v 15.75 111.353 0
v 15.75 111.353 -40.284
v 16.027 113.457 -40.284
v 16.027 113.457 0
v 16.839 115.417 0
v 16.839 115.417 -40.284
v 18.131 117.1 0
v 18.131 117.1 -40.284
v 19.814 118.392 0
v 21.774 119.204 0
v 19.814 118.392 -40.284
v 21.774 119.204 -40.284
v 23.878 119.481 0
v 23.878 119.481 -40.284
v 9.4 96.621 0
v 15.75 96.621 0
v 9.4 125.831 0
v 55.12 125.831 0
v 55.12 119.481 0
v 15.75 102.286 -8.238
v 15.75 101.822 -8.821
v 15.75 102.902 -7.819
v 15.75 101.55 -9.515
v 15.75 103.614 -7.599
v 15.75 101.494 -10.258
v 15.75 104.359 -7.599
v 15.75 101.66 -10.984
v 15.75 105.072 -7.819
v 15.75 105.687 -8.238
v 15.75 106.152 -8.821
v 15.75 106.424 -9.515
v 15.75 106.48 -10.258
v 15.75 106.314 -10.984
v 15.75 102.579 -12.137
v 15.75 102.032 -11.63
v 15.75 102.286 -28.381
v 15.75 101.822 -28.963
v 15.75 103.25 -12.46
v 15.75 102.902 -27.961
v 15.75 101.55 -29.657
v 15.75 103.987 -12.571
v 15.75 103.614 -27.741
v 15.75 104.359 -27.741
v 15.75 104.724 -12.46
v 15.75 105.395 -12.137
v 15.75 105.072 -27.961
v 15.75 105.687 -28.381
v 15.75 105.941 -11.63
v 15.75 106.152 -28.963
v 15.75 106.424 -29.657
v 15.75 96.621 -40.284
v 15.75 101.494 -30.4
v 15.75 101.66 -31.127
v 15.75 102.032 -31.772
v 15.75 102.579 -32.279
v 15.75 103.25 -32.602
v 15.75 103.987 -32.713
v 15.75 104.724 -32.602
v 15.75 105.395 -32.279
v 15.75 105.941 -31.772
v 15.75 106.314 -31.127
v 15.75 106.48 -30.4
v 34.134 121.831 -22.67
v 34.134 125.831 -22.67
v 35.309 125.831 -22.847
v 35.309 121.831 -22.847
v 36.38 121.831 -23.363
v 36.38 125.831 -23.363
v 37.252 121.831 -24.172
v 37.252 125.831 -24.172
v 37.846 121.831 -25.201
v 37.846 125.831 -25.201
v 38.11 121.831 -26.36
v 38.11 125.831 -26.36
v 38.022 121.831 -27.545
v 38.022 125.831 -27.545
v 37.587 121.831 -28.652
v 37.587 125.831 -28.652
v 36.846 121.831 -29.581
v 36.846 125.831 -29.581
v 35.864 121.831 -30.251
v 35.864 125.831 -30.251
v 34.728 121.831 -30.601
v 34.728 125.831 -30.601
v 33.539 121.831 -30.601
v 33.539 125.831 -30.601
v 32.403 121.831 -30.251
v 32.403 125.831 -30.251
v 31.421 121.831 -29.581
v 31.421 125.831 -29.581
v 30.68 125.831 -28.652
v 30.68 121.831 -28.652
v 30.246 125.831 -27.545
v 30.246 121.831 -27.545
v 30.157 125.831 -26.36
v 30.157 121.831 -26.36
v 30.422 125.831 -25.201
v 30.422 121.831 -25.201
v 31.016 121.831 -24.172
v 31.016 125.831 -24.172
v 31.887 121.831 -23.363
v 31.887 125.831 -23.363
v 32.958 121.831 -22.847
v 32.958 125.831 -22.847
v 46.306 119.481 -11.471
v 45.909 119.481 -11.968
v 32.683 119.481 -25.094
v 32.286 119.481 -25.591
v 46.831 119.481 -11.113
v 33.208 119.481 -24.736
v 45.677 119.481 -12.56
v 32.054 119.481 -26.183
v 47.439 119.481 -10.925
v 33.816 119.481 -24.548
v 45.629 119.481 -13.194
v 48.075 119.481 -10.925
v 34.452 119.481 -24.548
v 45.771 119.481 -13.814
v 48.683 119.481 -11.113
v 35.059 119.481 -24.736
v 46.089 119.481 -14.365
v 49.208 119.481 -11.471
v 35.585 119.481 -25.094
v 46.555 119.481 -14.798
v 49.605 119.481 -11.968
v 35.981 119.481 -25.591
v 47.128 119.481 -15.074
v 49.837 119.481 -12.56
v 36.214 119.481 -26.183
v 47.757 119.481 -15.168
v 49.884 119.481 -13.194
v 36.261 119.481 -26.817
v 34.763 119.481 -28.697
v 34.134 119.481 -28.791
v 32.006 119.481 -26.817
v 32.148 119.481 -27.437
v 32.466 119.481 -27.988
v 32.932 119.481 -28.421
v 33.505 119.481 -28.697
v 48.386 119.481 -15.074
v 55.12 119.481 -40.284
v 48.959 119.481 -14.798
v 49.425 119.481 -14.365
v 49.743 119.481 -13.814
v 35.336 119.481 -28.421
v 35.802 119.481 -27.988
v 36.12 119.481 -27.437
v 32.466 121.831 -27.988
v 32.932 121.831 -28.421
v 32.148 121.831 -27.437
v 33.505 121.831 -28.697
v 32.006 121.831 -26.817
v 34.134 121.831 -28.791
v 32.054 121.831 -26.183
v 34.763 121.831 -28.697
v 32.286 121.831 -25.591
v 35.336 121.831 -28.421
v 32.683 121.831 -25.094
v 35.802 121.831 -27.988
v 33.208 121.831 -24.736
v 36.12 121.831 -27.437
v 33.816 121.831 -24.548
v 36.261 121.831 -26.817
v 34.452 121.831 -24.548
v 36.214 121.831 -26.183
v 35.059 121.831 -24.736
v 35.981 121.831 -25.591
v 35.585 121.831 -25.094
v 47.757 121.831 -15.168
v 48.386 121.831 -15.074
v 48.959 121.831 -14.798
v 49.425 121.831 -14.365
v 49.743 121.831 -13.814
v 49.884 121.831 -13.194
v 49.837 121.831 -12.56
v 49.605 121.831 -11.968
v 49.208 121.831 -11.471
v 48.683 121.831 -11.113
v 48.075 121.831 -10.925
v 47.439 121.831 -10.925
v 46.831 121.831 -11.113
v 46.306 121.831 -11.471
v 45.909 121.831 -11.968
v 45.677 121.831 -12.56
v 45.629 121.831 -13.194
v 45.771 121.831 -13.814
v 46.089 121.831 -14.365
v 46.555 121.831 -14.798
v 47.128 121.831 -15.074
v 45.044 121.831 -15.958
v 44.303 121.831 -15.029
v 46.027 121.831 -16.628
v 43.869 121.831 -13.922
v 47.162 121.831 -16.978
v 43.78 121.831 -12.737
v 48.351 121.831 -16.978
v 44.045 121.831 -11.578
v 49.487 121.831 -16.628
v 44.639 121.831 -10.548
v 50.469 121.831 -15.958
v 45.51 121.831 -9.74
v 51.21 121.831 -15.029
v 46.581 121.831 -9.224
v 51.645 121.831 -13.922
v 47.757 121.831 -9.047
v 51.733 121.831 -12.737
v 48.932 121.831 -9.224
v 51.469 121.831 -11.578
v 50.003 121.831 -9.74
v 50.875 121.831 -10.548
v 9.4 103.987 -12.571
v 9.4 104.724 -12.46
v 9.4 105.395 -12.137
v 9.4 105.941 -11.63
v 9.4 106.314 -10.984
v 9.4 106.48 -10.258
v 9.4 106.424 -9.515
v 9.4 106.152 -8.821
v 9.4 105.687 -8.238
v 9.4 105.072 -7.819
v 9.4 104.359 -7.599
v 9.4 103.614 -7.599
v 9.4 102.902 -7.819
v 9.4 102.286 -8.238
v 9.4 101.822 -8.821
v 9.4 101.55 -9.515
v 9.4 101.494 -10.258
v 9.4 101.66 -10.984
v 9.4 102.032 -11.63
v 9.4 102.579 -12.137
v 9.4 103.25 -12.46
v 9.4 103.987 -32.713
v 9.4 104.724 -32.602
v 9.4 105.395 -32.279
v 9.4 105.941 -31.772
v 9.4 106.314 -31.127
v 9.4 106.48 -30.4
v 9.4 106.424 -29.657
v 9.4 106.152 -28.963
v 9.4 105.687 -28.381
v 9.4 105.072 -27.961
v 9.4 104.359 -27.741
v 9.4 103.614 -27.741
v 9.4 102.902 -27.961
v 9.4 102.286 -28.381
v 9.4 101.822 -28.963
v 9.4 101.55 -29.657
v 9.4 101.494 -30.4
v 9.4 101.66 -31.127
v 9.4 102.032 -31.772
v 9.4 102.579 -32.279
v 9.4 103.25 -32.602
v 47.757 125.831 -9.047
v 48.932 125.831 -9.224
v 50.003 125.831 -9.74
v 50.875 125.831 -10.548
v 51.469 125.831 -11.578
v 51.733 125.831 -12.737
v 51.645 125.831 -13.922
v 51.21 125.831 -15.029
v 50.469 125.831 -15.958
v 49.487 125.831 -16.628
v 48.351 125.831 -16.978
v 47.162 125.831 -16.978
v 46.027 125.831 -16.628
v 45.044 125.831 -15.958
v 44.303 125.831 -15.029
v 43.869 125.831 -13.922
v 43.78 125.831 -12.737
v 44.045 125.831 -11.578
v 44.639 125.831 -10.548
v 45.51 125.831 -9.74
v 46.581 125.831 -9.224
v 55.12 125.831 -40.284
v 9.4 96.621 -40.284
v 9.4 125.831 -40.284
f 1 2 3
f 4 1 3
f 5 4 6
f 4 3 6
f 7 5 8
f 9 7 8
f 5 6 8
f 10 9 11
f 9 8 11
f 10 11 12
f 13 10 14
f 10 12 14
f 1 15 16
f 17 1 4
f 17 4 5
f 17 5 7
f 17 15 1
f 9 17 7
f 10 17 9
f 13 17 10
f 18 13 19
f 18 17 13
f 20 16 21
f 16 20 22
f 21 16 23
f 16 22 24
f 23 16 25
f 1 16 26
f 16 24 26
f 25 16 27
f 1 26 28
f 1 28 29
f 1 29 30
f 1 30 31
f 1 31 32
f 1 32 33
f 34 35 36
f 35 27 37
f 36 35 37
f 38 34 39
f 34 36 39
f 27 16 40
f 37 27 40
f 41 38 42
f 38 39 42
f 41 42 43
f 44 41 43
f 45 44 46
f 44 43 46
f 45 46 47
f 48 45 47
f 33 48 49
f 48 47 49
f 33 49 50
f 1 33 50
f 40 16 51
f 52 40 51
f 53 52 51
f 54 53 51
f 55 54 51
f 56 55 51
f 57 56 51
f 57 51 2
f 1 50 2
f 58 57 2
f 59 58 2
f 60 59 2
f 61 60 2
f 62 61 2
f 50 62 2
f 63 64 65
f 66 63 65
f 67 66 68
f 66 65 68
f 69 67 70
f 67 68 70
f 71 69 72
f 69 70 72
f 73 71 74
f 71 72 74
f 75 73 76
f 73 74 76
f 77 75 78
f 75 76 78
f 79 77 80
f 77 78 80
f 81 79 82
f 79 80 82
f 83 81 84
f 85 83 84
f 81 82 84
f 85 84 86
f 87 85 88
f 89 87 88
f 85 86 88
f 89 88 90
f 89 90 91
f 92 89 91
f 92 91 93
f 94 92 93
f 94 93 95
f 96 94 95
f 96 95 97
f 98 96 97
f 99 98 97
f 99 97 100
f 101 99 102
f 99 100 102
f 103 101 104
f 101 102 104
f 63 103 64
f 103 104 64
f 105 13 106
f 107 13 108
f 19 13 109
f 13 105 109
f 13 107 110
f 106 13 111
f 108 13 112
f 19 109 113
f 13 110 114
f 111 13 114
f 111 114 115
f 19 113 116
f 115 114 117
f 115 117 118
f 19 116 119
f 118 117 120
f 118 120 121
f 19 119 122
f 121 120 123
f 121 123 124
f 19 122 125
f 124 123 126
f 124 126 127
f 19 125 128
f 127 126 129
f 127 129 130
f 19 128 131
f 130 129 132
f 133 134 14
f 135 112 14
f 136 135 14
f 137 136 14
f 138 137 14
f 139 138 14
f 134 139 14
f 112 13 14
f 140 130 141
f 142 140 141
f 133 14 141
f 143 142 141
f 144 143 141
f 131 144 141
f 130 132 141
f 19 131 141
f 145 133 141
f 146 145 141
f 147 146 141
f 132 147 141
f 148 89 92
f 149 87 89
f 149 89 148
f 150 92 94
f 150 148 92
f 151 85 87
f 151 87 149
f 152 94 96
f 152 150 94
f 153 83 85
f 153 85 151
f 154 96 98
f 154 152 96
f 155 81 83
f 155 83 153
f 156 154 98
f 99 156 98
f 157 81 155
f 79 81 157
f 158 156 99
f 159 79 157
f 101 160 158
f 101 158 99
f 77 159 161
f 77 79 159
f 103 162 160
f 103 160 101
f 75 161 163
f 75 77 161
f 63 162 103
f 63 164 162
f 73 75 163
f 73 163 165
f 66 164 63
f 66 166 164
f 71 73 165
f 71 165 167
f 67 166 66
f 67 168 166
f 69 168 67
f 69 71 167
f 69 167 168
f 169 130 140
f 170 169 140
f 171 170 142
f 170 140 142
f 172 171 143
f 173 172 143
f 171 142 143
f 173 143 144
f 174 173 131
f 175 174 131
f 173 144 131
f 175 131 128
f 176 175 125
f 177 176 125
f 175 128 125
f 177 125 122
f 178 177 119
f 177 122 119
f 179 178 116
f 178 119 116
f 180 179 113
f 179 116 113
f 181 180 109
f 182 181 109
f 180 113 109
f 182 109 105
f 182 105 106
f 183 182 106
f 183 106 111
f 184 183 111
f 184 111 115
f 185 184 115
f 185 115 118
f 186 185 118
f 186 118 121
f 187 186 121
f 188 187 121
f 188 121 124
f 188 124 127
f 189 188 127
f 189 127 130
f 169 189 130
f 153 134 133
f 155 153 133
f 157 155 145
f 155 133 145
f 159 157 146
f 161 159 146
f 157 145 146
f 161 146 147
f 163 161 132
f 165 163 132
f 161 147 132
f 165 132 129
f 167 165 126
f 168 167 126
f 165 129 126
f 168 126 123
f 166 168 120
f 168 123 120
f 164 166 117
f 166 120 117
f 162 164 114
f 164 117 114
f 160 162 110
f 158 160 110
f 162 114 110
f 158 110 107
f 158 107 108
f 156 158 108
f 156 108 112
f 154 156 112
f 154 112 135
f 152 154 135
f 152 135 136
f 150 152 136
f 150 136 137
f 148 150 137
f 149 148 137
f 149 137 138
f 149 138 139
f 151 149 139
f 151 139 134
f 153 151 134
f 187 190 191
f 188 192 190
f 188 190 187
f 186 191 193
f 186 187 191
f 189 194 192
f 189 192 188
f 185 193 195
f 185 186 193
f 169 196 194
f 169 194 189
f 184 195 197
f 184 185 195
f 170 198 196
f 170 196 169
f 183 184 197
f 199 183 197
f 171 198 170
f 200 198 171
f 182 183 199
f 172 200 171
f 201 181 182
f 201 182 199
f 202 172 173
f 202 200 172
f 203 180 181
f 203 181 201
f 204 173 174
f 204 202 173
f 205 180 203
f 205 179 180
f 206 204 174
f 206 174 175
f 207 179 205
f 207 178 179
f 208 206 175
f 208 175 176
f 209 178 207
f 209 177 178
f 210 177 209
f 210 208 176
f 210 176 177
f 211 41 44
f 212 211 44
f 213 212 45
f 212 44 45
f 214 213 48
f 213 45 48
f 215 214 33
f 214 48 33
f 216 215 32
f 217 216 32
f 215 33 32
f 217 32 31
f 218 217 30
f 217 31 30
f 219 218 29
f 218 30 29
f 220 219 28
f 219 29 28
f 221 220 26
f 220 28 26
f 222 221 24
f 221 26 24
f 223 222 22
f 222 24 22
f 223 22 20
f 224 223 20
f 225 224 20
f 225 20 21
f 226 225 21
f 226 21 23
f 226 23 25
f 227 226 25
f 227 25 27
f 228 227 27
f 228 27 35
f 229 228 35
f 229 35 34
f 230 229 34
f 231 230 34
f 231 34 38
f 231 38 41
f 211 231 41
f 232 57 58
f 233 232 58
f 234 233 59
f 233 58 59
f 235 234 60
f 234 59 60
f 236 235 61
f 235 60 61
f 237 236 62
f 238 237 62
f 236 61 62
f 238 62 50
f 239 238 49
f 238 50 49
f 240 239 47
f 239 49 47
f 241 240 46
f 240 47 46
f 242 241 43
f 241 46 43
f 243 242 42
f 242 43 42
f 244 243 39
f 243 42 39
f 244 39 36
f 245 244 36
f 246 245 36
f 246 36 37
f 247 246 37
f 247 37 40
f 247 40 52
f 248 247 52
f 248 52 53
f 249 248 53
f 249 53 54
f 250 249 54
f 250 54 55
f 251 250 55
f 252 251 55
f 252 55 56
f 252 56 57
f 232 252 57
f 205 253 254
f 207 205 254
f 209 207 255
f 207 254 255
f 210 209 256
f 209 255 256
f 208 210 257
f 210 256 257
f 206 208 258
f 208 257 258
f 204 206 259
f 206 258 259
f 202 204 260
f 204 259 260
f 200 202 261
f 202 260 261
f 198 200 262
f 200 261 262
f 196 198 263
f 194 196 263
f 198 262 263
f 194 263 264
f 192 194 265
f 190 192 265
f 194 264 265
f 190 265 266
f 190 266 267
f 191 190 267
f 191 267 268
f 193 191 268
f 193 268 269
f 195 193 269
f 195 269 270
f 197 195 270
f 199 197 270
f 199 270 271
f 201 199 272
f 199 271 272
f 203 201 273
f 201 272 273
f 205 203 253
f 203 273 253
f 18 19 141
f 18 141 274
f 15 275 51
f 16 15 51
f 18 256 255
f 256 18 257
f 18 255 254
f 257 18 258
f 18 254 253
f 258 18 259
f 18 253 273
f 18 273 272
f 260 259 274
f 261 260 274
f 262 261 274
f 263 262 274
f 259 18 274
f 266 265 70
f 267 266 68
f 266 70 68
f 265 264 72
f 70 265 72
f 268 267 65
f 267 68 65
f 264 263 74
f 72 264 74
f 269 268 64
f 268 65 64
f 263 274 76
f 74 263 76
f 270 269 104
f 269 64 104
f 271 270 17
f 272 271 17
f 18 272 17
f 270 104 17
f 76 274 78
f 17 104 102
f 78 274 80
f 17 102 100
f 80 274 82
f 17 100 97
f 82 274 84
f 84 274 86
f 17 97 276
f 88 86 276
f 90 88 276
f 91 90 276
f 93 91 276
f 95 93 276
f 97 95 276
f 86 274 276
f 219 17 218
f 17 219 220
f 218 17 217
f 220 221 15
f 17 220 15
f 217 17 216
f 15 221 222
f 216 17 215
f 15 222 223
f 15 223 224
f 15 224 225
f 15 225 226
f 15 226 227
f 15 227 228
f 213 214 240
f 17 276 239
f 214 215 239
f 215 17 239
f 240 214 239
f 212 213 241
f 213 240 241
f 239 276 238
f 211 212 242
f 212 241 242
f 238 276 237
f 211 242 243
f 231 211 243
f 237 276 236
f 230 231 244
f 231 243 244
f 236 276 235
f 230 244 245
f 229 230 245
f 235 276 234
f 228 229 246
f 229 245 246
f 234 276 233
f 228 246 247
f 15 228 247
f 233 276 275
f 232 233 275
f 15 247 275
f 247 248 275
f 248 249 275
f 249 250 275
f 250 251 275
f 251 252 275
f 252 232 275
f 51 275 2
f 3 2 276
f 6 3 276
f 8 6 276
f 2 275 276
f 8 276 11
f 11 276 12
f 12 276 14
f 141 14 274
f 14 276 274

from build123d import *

# Parameters (mm, degrees)
BOSS_EXTRUDE1_DEPTH = 40.2844
SKETCH2_R           = 2.1336
CUT_EXTRUDE1_DEPTH  = 72.997408866
SKETCH3_R           = 3.9878
CUT_EXTRUDE2_DEPTH  = 4
SKETCH4_R           = 2.5
CUT_EXTRUDE3_DEPTH  = 138.863130215


with BuildPart() as part:
    # Sketch1 → Boss-Extrude1 (new body)
    with BuildSketch(Plane.XY):
        with BuildLine():
            Line((55.12, 125.830890045), (9.4, 125.830890045))
            Line((9.4, 125.830890045), (9.4, 96.620890045))
            Line((9.4, 96.620890045), (15.75, 96.620890045))
            Line((15.75, 96.620890045), (15.75, 111.352890045))
            ThreePointArc((15.75, 111.352890045), (18.130636083, 117.100253962), (23.878, 119.480890045))
            Line((23.878, 119.480890045), (55.12, 119.480890045))
            Line((55.12, 119.480890045), (55.12, 125.830890045))
        make_face()
    extrude(amount=-BOSS_EXTRUDE1_DEPTH)

    # Sketch2 → Cut-Extrude1 (cut, through all)
    with BuildSketch(Plane(origin=(0, 119.480890045, 0), x_dir=(-1, 0, 0), z_dir=(0, -1, 0))):
        with Locations((-47.756789836, 13.03483709)):
            Circle(SKETCH2_R)
        with Locations((-34.133741301, 26.657885626)):
            Circle(SKETCH2_R)
    extrude(amount=-CUT_EXTRUDE1_DEPTH, mode=Mode.SUBTRACT)

    # Sketch3 → Cut-Extrude2 (cut)
    with BuildSketch(Plane(origin=(0, 125.830890045, 0), x_dir=(1, 0, 0), z_dir=(0, 1, 0))):
        with Locations((47.756789836, 13.03483709)):
            Circle(SKETCH3_R)
        with Locations((34.133741301, 26.657885626)):
            Circle(SKETCH3_R)
    extrude(amount=-CUT_EXTRUDE2_DEPTH, mode=Mode.SUBTRACT)

    # Sketch4 → Cut-Extrude3 (cut, through all)
    with BuildSketch(Plane(origin=(15.75, 0, 0), x_dir=(0, 0, -1), z_dir=(1, 0, 0))):
        with Locations((10.0711, 103.986890045)):
            Circle(SKETCH4_R)
        with Locations((30.2133, 103.986890045)):
            Circle(SKETCH4_R)
    extrude(amount=-CUT_EXTRUDE3_DEPTH, mode=Mode.SUBTRACT)


solid = part.part
